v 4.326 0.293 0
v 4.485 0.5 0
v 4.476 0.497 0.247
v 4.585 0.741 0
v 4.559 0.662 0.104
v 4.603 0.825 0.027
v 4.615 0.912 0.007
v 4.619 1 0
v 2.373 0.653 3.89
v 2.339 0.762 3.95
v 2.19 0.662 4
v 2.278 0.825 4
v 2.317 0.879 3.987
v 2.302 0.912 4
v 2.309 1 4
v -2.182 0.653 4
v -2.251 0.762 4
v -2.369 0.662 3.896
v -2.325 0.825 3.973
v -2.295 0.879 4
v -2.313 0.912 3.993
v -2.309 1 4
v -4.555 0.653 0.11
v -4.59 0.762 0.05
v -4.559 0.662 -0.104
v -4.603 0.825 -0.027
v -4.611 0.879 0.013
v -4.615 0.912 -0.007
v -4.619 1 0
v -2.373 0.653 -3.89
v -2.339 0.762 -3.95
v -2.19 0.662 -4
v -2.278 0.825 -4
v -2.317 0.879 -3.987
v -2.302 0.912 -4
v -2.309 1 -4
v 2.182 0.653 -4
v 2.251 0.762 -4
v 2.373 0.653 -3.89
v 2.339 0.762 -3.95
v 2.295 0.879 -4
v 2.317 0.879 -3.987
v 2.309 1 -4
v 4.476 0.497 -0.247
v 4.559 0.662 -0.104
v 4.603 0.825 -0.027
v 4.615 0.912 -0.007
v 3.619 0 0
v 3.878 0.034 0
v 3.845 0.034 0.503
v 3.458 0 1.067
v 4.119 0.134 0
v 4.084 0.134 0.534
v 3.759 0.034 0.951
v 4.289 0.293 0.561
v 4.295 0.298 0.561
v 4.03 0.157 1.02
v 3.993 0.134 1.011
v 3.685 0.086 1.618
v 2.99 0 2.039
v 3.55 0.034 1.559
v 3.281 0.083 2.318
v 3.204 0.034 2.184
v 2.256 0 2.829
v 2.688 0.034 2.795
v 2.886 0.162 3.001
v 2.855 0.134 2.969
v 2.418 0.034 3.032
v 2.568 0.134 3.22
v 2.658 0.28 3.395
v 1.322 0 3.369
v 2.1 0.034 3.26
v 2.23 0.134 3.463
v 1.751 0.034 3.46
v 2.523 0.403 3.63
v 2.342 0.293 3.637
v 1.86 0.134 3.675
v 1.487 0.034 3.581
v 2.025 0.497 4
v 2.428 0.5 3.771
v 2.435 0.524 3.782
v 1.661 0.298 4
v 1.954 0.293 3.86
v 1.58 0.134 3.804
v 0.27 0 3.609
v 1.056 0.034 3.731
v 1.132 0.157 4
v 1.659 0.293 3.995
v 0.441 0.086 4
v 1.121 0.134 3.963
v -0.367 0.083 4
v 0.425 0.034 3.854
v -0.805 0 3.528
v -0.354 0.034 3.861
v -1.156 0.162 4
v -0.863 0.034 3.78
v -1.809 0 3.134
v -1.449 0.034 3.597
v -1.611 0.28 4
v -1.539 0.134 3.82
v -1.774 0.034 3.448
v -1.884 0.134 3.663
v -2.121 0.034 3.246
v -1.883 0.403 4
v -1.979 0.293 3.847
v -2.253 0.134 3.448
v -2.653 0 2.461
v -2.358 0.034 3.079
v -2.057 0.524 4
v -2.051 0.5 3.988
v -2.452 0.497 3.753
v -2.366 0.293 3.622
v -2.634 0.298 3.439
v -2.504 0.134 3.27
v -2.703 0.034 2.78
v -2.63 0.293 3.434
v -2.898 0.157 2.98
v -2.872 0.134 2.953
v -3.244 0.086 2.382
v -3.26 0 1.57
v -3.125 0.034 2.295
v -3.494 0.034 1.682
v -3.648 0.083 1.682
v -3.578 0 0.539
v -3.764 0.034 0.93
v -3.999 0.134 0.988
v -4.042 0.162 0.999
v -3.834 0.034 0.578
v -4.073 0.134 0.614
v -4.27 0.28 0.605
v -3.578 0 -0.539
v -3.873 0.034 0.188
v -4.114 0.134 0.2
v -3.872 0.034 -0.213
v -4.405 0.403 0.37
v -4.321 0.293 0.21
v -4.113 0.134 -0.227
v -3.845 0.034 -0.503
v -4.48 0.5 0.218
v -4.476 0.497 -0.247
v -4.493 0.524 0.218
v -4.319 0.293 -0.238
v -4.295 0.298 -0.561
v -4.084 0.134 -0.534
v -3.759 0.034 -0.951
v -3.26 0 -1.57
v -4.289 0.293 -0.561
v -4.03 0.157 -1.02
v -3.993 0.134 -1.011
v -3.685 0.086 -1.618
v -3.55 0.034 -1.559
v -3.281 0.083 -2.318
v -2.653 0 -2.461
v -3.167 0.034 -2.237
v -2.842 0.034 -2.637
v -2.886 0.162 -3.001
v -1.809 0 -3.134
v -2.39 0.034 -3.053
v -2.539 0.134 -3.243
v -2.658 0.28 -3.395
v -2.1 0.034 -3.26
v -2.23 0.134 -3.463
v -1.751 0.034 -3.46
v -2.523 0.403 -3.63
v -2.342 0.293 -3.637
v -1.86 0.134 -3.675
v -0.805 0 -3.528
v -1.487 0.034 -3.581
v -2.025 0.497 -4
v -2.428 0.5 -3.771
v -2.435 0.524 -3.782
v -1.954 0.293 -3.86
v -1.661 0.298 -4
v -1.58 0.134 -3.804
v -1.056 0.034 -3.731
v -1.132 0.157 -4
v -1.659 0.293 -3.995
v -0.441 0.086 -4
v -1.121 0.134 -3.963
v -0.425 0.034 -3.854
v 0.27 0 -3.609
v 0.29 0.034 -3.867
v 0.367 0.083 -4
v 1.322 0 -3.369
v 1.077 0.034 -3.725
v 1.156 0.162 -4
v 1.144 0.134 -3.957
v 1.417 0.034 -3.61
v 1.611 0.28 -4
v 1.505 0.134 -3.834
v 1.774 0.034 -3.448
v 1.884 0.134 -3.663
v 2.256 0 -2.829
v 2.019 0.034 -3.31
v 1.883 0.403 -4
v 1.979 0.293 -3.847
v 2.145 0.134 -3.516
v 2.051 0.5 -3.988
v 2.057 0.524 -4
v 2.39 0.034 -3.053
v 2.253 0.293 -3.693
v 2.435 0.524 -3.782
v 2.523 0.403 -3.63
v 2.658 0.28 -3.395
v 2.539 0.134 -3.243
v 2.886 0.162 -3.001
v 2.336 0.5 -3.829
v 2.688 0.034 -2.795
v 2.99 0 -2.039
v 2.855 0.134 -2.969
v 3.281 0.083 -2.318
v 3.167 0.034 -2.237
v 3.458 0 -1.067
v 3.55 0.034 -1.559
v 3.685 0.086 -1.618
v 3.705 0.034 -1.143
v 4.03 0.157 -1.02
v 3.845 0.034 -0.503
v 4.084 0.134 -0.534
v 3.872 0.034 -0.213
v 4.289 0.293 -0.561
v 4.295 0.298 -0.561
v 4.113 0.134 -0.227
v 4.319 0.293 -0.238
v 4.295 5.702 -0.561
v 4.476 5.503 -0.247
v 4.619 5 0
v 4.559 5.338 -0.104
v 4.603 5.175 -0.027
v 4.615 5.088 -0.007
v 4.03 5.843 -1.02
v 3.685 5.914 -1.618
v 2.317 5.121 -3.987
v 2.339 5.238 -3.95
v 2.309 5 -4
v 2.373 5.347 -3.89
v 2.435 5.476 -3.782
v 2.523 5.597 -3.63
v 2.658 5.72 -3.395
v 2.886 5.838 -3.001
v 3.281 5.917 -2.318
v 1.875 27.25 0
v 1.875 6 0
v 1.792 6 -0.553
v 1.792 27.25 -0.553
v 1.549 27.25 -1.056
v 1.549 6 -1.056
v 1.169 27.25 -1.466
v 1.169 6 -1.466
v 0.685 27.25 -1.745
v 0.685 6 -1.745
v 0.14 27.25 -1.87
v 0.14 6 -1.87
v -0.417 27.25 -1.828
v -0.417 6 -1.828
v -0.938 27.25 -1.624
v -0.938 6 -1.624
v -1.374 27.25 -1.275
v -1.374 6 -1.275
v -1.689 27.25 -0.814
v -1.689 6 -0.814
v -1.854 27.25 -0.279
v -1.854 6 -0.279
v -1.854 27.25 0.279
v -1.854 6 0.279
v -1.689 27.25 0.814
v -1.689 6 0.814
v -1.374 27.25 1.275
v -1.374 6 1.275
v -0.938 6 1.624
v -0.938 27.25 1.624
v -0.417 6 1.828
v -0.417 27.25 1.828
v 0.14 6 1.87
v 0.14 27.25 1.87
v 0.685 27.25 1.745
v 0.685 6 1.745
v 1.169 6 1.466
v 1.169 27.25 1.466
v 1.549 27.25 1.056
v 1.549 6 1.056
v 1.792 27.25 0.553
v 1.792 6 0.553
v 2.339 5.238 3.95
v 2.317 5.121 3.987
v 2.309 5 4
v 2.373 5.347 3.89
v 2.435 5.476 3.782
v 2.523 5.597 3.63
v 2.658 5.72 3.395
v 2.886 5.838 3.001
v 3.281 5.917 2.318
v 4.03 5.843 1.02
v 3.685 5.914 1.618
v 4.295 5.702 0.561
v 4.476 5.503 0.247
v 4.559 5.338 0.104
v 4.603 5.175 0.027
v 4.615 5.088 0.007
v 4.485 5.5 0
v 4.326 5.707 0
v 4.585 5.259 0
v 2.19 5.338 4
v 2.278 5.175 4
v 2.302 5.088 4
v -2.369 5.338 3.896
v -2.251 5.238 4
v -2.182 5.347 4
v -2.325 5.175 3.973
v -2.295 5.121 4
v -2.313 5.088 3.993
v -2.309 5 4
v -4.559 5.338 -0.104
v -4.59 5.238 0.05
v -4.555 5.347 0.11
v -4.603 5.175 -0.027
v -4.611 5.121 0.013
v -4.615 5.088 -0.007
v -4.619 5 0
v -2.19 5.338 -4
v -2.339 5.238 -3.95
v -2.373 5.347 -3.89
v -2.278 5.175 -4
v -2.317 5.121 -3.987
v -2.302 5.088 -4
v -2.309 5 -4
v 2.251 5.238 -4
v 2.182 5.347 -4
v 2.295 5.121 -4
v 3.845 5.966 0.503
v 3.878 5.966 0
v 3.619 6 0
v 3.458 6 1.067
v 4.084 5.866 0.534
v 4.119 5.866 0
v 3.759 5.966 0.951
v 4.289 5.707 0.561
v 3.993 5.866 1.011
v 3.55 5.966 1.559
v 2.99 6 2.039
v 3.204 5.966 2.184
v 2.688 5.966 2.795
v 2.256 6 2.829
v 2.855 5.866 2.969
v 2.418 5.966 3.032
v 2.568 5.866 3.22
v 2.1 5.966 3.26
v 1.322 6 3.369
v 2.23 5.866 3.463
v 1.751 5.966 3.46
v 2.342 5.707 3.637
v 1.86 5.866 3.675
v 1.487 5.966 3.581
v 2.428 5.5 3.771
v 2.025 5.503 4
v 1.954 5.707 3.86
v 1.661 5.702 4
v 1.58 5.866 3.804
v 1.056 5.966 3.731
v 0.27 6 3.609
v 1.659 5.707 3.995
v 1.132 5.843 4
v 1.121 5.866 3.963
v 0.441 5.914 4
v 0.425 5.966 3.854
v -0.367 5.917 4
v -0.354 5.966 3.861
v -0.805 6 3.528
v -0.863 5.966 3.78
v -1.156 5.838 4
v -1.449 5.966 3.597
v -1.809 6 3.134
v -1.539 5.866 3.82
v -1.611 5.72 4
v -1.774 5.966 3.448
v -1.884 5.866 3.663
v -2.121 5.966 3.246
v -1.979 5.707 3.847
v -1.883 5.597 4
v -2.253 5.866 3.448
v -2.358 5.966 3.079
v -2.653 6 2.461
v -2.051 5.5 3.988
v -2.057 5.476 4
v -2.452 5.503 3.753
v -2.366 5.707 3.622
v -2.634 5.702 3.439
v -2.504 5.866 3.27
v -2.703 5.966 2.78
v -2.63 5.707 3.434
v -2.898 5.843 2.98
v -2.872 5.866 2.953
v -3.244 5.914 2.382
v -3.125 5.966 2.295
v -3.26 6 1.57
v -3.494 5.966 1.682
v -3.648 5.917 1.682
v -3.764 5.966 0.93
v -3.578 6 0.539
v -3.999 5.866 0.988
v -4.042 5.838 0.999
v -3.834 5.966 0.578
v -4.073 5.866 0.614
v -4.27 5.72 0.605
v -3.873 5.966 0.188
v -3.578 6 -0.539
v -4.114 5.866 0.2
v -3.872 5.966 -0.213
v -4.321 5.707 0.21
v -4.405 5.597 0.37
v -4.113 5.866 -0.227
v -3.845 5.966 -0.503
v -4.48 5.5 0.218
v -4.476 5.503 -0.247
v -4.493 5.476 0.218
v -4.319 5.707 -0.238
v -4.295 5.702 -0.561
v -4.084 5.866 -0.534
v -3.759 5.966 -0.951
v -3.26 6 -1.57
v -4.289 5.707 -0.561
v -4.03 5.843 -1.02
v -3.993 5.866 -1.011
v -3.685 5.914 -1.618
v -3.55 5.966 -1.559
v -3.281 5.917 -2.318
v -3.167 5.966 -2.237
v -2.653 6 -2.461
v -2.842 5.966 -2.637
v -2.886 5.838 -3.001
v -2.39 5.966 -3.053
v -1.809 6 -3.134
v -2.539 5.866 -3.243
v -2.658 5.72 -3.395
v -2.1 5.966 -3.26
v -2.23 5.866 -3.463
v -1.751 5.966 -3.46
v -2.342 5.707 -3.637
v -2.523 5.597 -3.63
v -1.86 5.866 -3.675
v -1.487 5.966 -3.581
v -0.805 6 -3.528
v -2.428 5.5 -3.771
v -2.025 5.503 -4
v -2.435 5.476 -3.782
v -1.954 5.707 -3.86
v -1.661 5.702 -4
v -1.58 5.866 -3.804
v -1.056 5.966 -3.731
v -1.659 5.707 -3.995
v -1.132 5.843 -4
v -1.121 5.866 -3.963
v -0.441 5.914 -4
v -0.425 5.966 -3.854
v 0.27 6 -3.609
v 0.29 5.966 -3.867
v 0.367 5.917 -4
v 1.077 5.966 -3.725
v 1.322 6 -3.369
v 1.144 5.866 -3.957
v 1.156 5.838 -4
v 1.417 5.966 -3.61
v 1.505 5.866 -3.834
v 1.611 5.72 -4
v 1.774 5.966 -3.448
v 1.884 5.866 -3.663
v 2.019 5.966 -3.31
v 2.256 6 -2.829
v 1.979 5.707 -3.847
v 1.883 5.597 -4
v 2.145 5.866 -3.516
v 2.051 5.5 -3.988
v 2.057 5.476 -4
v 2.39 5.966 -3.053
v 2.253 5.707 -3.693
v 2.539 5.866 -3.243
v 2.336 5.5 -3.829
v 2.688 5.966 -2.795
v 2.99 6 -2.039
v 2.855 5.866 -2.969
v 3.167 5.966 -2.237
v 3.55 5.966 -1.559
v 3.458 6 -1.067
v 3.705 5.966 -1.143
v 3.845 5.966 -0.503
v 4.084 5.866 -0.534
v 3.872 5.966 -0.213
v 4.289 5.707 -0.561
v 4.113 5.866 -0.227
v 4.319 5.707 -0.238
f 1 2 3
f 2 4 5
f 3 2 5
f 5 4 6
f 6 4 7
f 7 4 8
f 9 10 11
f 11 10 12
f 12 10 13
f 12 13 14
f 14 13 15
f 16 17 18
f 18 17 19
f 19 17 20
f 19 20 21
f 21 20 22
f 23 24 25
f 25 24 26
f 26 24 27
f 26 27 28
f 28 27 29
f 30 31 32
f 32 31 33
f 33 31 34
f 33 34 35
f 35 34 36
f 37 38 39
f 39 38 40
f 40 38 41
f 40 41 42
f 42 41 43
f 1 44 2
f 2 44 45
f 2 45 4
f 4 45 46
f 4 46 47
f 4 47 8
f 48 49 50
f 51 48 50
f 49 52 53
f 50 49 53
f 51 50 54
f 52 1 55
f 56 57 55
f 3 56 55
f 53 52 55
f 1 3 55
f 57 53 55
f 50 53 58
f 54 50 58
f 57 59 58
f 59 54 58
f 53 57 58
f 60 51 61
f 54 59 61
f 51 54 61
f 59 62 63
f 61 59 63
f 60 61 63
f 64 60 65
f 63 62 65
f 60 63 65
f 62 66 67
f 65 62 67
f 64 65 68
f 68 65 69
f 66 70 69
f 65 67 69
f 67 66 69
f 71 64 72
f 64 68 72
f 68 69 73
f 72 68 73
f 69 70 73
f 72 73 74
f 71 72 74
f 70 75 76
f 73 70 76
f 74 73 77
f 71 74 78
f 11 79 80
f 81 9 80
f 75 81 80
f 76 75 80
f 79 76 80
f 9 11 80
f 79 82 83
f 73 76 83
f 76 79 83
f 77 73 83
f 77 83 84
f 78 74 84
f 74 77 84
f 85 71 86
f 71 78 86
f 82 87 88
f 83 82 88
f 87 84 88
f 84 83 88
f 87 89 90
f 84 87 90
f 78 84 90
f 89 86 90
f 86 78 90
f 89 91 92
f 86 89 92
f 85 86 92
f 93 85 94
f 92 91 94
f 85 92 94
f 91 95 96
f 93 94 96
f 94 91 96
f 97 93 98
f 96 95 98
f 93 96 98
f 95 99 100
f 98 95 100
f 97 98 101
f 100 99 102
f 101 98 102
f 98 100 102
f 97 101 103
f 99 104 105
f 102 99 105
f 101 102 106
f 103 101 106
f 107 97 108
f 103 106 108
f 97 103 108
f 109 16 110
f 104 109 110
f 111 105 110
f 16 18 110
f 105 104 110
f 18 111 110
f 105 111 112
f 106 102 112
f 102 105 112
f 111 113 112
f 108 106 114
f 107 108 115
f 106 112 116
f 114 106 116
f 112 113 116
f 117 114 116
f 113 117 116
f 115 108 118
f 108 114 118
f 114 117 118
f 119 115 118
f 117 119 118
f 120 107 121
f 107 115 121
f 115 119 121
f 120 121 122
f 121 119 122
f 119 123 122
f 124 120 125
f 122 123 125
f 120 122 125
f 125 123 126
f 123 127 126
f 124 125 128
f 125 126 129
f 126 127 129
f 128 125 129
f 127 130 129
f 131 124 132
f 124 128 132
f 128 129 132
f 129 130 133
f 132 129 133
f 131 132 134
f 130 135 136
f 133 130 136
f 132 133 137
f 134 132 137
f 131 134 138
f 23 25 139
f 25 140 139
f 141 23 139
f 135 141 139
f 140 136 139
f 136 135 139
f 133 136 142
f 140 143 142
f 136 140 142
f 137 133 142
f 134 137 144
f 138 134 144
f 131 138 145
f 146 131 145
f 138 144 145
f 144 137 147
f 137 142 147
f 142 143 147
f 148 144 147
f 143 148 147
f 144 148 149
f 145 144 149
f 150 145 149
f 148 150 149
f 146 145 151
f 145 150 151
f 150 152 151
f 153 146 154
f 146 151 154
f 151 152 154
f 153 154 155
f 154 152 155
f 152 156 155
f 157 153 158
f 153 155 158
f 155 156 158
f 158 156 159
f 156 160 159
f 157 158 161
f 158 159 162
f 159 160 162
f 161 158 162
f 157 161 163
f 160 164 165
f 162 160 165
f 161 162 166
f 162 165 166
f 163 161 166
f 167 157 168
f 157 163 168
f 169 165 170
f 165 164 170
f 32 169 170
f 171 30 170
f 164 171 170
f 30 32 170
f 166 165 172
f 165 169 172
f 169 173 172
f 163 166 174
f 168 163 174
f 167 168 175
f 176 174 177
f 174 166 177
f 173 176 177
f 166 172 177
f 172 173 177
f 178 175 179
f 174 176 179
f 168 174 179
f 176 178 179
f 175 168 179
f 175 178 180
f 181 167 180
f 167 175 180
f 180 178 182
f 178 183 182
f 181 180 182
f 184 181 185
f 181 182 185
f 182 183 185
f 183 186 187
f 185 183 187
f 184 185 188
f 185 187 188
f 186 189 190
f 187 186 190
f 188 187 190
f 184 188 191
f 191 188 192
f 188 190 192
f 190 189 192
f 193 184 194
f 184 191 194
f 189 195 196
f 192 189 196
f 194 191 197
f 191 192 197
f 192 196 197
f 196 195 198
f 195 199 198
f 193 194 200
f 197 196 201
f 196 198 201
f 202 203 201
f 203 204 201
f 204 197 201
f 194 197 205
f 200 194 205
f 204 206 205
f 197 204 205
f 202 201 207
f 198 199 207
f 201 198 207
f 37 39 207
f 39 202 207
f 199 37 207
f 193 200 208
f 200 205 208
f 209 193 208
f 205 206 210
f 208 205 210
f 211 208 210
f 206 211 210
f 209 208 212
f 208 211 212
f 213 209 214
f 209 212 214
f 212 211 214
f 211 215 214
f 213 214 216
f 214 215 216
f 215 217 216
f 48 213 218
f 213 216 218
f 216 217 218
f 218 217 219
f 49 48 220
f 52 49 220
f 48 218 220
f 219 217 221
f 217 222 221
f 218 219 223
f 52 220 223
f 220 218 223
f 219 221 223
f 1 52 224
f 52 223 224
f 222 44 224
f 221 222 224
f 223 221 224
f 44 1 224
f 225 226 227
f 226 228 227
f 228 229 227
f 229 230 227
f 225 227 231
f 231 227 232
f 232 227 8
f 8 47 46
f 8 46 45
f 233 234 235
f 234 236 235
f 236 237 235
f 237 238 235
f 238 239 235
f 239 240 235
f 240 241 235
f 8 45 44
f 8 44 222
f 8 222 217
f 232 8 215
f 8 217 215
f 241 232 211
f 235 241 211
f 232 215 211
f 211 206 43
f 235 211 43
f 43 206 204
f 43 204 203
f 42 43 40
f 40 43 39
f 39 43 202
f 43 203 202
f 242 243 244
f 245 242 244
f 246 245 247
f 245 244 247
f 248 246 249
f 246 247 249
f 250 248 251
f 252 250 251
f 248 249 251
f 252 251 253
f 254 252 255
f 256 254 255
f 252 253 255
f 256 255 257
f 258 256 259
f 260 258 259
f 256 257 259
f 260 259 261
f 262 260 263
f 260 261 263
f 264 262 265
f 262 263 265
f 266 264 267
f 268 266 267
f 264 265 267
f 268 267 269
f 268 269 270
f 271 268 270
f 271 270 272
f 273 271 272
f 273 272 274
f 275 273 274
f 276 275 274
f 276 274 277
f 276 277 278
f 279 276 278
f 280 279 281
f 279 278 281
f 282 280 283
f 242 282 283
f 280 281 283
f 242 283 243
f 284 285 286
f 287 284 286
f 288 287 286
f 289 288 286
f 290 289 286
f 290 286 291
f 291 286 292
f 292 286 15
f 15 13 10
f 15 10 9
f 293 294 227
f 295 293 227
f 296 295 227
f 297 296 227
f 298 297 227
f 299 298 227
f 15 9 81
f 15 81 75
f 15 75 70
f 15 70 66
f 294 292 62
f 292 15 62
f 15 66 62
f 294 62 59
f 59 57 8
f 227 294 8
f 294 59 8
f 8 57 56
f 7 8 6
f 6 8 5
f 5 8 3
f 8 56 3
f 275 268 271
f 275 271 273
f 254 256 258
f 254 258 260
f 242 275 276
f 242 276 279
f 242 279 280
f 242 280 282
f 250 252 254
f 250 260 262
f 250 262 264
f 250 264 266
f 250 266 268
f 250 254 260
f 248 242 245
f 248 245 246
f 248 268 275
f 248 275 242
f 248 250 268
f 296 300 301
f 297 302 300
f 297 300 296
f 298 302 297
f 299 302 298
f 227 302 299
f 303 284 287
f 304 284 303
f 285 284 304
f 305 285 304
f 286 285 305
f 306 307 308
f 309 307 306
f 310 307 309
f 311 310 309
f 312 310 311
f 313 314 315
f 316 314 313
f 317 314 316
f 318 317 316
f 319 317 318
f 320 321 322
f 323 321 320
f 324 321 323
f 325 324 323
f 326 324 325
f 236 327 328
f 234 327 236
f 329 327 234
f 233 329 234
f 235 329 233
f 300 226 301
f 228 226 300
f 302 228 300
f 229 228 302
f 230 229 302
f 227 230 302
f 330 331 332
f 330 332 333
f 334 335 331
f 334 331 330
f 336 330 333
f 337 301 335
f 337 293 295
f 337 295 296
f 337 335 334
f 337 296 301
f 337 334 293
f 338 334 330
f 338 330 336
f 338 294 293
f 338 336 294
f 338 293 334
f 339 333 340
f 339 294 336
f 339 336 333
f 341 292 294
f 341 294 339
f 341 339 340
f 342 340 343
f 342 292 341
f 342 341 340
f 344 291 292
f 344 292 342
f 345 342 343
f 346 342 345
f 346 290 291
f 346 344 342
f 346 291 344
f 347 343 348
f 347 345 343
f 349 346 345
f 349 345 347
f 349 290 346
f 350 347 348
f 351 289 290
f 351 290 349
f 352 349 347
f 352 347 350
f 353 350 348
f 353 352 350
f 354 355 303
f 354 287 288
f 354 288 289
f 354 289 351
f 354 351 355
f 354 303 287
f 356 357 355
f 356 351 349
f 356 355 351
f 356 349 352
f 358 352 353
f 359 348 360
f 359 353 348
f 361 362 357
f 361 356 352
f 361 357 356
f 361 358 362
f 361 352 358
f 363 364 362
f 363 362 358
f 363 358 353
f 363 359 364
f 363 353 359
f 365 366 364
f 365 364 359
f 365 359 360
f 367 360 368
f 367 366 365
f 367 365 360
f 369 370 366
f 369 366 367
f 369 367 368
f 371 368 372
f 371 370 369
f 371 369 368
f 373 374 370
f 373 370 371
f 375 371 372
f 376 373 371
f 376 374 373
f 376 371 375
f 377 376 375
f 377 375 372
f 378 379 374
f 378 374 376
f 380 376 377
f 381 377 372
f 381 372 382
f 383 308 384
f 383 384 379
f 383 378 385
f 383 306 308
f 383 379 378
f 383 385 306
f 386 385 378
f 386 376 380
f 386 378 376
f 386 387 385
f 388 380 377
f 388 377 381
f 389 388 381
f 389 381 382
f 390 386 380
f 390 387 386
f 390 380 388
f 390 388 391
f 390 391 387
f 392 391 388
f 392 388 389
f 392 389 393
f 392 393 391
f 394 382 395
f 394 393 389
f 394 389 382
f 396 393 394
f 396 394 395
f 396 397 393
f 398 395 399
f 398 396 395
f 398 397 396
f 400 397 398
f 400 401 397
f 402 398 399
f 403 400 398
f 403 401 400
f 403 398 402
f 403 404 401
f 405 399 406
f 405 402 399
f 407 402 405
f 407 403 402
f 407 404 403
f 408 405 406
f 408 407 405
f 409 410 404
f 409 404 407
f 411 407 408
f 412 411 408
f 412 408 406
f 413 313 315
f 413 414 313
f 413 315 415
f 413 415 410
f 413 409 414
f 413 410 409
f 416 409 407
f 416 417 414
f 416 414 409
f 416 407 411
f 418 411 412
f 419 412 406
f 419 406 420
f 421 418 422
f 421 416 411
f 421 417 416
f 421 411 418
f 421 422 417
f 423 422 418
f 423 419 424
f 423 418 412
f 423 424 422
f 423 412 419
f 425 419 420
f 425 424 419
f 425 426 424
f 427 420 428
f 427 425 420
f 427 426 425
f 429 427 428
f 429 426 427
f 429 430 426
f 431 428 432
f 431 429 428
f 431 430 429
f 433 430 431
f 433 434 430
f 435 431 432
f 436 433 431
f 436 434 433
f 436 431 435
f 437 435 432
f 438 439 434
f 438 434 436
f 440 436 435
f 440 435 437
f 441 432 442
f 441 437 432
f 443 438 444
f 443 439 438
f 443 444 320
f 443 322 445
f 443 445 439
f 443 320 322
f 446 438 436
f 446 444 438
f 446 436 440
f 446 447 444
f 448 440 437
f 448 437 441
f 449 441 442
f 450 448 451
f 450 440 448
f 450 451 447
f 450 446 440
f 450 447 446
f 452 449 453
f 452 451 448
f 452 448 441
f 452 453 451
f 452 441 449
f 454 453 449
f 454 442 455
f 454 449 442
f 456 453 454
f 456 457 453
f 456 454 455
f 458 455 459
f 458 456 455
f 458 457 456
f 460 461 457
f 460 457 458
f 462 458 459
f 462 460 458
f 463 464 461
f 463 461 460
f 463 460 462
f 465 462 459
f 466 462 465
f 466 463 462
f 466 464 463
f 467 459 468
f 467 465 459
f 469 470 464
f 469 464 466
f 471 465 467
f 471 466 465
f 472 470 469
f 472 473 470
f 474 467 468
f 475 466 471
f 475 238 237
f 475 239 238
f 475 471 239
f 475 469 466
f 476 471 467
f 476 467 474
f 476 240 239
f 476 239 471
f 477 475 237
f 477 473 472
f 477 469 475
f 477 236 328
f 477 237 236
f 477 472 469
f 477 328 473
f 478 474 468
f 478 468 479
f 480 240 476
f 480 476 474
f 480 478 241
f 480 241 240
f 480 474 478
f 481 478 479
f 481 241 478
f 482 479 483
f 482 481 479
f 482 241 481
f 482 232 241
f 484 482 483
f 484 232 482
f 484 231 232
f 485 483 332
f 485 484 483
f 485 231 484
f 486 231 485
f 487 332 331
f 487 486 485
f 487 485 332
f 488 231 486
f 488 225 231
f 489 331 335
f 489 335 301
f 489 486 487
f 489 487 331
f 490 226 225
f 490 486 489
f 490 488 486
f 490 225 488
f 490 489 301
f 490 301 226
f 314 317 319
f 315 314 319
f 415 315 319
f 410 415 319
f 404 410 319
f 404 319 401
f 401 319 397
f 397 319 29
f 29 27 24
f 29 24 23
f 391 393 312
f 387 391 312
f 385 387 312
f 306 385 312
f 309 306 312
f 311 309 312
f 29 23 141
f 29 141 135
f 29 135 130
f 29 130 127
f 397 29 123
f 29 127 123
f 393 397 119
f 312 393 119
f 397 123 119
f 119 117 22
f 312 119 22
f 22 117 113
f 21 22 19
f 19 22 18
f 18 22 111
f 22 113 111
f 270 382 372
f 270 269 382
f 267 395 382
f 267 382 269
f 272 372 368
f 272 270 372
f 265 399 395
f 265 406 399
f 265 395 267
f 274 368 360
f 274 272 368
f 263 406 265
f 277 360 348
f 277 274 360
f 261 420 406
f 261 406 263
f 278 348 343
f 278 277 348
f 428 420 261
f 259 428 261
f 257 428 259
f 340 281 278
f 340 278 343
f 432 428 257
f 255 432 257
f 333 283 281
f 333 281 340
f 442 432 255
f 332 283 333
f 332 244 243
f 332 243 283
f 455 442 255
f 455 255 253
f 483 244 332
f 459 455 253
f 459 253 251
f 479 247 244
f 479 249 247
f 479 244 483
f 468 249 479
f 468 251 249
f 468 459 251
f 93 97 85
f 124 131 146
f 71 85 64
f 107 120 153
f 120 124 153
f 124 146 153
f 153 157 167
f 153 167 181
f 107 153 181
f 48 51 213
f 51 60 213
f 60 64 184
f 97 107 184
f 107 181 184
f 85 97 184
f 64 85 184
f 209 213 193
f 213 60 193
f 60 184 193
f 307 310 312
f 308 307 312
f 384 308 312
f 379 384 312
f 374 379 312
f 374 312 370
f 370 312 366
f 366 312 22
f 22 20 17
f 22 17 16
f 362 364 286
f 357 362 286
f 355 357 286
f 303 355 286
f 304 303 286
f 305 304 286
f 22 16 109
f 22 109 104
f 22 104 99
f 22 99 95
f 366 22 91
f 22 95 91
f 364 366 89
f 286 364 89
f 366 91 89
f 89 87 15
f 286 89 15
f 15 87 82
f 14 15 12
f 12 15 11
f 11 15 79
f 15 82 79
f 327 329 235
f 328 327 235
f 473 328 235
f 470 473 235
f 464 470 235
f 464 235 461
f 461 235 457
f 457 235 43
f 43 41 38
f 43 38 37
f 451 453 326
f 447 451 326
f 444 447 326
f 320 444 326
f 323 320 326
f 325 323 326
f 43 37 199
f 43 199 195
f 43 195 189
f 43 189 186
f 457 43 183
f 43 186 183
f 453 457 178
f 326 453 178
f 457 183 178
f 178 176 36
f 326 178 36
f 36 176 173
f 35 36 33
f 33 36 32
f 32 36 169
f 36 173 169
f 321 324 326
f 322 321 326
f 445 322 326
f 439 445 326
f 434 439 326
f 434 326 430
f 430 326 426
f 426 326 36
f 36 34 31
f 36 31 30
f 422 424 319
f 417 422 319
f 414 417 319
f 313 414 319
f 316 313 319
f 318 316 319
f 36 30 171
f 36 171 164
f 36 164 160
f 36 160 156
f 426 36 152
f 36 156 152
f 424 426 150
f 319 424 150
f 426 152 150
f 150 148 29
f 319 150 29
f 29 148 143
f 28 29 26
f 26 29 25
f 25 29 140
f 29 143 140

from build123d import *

# Parameters (mm, degrees)
BOSS_EXTRUDE1_DEPTH = 6
SKETCH2_R           = 1.875
BOSS_EXTRUDE2_DEPTH = 21.25


with BuildPart() as part:
    # Sketch1 → Boss-Extrude1 (new body)
    with BuildSketch(Plane(origin=(0, 0, 0), x_dir=(1, 0, 0), z_dir=(0, 1, 0))):
        Polygon((4.618802154, 0), (2.309401077, 4), (-2.309401077, 4), (-4.618802154, 0), (-2.309401077, -4), (2.309401077, -4), align=None)
    extrude(amount=BOSS_EXTRUDE1_DEPTH)

    # Sketch2 → Boss-Extrude2 (add)
    with BuildSketch(Plane(origin=(0, 6, 0), x_dir=(1, 0, 0), z_dir=(0, 1, 0))):
        Circle(SKETCH2_R)
    extrude(amount=BOSS_EXTRUDE2_DEPTH)

    # Sketch3 → Cut-Revolve1 (revolve, cut)
    with BuildSketch(Plane.XY):
        with BuildLine():
            Line((4.618802154, 0), (3.618802154, 0))
            ThreePointArc((3.618802154, 0), (4.325908935, 0.292893219), (4.618802154, 1))
            Line((4.618802154, 1), (4.618802154, 0))
        make_face()
        with BuildLine():
            Line((4.618802154, 5), (4.618802154, 6))
            Line((4.618802154, 6), (3.618802154, 6))
            ThreePointArc((3.618802154, 6), (4.325908935, 5.707106781), (4.618802154, 5))
        make_face()
    revolve(axis=Axis((0, 0, 0), (0, -1, 0)), mode=Mode.SUBTRACT)


solid = part.part
